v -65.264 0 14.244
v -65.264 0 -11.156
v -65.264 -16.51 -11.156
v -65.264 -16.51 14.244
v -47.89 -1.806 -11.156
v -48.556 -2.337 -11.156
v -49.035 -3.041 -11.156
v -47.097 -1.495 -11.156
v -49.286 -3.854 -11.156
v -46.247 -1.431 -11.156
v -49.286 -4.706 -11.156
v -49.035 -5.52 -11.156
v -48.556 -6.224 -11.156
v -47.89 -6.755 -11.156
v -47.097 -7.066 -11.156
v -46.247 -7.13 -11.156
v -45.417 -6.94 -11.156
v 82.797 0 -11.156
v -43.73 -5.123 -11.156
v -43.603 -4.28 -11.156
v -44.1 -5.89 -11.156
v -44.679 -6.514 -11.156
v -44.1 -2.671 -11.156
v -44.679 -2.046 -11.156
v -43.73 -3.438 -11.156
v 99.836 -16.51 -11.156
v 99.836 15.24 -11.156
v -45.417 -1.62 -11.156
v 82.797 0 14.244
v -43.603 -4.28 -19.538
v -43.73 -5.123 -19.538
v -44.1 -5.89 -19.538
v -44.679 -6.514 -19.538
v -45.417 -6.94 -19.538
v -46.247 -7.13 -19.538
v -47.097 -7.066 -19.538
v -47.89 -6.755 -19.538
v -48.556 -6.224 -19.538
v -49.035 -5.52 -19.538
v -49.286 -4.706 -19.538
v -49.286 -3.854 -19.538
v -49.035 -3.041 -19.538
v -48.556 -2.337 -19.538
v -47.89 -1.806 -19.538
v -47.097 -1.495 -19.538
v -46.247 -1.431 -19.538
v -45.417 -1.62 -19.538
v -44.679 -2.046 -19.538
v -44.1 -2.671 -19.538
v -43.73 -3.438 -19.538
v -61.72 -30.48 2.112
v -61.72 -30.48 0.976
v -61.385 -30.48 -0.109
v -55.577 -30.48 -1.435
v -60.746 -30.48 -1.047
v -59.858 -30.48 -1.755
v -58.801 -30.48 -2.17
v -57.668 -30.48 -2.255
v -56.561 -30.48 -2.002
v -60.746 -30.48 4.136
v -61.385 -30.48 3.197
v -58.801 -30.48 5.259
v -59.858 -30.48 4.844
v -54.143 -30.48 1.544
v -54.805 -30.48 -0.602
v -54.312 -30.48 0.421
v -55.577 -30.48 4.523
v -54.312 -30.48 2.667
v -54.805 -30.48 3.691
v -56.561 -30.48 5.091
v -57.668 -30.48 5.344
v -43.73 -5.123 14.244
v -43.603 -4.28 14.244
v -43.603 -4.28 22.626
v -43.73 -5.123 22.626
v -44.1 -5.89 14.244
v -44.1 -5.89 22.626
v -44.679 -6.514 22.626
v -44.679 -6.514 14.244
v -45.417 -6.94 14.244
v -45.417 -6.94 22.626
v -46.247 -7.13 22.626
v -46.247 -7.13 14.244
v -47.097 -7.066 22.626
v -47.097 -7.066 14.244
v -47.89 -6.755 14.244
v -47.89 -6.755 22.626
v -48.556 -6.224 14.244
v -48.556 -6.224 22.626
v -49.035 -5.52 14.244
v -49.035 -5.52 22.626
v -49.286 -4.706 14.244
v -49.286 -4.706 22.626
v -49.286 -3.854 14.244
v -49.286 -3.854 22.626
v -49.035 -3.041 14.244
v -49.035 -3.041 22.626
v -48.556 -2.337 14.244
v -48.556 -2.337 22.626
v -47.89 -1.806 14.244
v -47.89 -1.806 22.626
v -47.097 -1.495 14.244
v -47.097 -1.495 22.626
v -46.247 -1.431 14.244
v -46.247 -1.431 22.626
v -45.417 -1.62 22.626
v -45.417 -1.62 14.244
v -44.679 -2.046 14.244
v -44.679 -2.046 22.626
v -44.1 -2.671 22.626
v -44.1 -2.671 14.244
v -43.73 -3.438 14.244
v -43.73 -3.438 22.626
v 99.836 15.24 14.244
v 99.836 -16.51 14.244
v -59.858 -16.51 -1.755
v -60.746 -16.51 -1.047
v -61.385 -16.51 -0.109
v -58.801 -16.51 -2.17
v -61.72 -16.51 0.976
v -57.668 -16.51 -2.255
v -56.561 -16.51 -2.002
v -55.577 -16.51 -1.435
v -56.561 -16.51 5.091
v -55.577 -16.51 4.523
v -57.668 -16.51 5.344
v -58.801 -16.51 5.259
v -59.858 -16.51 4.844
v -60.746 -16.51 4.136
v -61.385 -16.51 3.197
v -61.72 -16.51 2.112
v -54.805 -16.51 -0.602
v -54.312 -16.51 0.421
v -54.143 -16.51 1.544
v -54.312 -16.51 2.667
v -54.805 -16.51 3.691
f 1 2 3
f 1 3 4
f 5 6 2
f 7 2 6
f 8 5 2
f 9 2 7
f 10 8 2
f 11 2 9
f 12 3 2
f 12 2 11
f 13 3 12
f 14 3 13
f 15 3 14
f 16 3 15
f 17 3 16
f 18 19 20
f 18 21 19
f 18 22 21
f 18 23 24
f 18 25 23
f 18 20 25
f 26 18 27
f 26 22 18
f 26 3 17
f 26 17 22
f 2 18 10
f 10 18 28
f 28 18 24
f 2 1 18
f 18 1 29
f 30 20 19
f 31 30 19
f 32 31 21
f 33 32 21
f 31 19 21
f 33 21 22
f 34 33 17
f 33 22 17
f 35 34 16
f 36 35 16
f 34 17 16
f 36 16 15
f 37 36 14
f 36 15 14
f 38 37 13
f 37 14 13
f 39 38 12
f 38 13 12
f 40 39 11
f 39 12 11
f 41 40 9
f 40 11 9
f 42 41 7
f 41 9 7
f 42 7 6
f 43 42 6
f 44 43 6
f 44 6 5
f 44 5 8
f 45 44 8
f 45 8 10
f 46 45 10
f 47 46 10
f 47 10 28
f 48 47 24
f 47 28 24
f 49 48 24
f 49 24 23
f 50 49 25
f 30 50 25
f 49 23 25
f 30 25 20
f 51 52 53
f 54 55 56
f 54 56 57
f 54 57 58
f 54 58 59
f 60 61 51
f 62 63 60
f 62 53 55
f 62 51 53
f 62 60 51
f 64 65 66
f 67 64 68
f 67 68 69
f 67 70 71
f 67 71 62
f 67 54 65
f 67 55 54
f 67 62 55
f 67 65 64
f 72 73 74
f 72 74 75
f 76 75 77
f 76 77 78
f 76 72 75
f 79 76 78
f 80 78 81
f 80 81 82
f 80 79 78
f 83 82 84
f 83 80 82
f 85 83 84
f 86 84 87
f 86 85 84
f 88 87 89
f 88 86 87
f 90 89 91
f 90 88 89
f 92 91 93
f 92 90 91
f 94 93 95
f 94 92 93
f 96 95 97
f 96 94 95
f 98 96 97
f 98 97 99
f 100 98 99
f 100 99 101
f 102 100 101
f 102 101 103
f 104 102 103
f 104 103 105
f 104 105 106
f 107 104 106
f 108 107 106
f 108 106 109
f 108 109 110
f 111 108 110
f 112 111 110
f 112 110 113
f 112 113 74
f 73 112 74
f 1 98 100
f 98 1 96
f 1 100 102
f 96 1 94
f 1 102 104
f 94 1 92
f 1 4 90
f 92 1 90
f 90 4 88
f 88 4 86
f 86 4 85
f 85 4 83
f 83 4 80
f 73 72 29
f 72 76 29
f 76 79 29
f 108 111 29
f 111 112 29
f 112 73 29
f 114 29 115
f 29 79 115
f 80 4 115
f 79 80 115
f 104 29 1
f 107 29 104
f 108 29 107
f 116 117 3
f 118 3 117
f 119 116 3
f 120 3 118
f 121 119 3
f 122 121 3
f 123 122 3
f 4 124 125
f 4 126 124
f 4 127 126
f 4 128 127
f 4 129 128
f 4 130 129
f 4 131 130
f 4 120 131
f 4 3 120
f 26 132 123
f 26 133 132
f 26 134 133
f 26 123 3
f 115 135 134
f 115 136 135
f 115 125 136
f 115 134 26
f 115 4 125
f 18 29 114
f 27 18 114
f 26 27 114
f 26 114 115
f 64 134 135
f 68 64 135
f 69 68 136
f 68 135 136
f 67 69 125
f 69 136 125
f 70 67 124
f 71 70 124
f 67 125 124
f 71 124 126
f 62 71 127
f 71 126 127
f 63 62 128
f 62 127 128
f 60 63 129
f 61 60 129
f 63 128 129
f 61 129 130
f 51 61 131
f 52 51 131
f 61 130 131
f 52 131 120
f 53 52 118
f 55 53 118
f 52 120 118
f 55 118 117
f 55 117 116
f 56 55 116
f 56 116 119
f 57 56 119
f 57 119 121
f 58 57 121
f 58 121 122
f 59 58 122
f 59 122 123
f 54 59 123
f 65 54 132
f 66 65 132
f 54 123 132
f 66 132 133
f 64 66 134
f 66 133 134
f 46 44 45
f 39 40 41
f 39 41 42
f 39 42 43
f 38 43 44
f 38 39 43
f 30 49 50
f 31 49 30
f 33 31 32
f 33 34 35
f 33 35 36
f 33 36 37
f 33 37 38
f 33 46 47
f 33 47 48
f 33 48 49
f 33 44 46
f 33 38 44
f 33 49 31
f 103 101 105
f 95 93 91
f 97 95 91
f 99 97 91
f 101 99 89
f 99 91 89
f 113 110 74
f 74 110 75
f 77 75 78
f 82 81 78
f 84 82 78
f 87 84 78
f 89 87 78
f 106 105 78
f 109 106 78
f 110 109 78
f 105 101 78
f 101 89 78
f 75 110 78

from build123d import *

# Parameters (mm, degrees)
F0_W          = 165.1
F0_H          = 25.4
F1_DEPTH      = 16.51
F2_R          = 3.81
F3_DEPTH      = 13.97
F5_R          = 2.8575
F6_DEPTH      = 8.382
F6_DEPTH_BACK = 33.782
F7_DEPTH      = 25.4


# Not quite as in the source:
# - a feature names something its author has since deleted; it is built from what else it names


with BuildPart() as f1:
    # F0 (on Front) → F1 (new body)
    with BuildSketch(Plane.XZ):
        with Locations((17.2861106694, 1.5442719363)):
            Rectangle(F0_W, F0_H)
    extrude(amount=F1_DEPTH)

    # F2 (on face) → F3 (join)
    with BuildSketch(Plane.XZ.offset(16.51)):
        with Locations((-57.9527877271, 1.5442719363)):
            Circle(F2_R)
    extrude(amount=F3_DEPTH)

    # F5 (on face) → F6 (join, two sides)
    with BuildSketch(Plane(origin=(0, 0, -11.1557280637), x_dir=(1, 0, 0), z_dir=(0, 0, -1))) as f6_sk:
        with Locations((-46.4608334005, 4.2803706601)):
            Circle(F5_R)
    extrude(amount=F6_DEPTH)
    extrude(f6_sk.sketch, amount=-F6_DEPTH_BACK)

    # F4 (on face) → F7 (join)
    with BuildSketch(Plane(origin=(0, 0, -11.1557280637), x_dir=(1, 0, 0), z_dir=(0, 0, -1))):
        Polygon((99.8361106694, 0), (82.7972726808, 0), (99.8361106694, -15.24), align=None)
    extrude(amount=-F7_DEPTH)


solid = f1.part
